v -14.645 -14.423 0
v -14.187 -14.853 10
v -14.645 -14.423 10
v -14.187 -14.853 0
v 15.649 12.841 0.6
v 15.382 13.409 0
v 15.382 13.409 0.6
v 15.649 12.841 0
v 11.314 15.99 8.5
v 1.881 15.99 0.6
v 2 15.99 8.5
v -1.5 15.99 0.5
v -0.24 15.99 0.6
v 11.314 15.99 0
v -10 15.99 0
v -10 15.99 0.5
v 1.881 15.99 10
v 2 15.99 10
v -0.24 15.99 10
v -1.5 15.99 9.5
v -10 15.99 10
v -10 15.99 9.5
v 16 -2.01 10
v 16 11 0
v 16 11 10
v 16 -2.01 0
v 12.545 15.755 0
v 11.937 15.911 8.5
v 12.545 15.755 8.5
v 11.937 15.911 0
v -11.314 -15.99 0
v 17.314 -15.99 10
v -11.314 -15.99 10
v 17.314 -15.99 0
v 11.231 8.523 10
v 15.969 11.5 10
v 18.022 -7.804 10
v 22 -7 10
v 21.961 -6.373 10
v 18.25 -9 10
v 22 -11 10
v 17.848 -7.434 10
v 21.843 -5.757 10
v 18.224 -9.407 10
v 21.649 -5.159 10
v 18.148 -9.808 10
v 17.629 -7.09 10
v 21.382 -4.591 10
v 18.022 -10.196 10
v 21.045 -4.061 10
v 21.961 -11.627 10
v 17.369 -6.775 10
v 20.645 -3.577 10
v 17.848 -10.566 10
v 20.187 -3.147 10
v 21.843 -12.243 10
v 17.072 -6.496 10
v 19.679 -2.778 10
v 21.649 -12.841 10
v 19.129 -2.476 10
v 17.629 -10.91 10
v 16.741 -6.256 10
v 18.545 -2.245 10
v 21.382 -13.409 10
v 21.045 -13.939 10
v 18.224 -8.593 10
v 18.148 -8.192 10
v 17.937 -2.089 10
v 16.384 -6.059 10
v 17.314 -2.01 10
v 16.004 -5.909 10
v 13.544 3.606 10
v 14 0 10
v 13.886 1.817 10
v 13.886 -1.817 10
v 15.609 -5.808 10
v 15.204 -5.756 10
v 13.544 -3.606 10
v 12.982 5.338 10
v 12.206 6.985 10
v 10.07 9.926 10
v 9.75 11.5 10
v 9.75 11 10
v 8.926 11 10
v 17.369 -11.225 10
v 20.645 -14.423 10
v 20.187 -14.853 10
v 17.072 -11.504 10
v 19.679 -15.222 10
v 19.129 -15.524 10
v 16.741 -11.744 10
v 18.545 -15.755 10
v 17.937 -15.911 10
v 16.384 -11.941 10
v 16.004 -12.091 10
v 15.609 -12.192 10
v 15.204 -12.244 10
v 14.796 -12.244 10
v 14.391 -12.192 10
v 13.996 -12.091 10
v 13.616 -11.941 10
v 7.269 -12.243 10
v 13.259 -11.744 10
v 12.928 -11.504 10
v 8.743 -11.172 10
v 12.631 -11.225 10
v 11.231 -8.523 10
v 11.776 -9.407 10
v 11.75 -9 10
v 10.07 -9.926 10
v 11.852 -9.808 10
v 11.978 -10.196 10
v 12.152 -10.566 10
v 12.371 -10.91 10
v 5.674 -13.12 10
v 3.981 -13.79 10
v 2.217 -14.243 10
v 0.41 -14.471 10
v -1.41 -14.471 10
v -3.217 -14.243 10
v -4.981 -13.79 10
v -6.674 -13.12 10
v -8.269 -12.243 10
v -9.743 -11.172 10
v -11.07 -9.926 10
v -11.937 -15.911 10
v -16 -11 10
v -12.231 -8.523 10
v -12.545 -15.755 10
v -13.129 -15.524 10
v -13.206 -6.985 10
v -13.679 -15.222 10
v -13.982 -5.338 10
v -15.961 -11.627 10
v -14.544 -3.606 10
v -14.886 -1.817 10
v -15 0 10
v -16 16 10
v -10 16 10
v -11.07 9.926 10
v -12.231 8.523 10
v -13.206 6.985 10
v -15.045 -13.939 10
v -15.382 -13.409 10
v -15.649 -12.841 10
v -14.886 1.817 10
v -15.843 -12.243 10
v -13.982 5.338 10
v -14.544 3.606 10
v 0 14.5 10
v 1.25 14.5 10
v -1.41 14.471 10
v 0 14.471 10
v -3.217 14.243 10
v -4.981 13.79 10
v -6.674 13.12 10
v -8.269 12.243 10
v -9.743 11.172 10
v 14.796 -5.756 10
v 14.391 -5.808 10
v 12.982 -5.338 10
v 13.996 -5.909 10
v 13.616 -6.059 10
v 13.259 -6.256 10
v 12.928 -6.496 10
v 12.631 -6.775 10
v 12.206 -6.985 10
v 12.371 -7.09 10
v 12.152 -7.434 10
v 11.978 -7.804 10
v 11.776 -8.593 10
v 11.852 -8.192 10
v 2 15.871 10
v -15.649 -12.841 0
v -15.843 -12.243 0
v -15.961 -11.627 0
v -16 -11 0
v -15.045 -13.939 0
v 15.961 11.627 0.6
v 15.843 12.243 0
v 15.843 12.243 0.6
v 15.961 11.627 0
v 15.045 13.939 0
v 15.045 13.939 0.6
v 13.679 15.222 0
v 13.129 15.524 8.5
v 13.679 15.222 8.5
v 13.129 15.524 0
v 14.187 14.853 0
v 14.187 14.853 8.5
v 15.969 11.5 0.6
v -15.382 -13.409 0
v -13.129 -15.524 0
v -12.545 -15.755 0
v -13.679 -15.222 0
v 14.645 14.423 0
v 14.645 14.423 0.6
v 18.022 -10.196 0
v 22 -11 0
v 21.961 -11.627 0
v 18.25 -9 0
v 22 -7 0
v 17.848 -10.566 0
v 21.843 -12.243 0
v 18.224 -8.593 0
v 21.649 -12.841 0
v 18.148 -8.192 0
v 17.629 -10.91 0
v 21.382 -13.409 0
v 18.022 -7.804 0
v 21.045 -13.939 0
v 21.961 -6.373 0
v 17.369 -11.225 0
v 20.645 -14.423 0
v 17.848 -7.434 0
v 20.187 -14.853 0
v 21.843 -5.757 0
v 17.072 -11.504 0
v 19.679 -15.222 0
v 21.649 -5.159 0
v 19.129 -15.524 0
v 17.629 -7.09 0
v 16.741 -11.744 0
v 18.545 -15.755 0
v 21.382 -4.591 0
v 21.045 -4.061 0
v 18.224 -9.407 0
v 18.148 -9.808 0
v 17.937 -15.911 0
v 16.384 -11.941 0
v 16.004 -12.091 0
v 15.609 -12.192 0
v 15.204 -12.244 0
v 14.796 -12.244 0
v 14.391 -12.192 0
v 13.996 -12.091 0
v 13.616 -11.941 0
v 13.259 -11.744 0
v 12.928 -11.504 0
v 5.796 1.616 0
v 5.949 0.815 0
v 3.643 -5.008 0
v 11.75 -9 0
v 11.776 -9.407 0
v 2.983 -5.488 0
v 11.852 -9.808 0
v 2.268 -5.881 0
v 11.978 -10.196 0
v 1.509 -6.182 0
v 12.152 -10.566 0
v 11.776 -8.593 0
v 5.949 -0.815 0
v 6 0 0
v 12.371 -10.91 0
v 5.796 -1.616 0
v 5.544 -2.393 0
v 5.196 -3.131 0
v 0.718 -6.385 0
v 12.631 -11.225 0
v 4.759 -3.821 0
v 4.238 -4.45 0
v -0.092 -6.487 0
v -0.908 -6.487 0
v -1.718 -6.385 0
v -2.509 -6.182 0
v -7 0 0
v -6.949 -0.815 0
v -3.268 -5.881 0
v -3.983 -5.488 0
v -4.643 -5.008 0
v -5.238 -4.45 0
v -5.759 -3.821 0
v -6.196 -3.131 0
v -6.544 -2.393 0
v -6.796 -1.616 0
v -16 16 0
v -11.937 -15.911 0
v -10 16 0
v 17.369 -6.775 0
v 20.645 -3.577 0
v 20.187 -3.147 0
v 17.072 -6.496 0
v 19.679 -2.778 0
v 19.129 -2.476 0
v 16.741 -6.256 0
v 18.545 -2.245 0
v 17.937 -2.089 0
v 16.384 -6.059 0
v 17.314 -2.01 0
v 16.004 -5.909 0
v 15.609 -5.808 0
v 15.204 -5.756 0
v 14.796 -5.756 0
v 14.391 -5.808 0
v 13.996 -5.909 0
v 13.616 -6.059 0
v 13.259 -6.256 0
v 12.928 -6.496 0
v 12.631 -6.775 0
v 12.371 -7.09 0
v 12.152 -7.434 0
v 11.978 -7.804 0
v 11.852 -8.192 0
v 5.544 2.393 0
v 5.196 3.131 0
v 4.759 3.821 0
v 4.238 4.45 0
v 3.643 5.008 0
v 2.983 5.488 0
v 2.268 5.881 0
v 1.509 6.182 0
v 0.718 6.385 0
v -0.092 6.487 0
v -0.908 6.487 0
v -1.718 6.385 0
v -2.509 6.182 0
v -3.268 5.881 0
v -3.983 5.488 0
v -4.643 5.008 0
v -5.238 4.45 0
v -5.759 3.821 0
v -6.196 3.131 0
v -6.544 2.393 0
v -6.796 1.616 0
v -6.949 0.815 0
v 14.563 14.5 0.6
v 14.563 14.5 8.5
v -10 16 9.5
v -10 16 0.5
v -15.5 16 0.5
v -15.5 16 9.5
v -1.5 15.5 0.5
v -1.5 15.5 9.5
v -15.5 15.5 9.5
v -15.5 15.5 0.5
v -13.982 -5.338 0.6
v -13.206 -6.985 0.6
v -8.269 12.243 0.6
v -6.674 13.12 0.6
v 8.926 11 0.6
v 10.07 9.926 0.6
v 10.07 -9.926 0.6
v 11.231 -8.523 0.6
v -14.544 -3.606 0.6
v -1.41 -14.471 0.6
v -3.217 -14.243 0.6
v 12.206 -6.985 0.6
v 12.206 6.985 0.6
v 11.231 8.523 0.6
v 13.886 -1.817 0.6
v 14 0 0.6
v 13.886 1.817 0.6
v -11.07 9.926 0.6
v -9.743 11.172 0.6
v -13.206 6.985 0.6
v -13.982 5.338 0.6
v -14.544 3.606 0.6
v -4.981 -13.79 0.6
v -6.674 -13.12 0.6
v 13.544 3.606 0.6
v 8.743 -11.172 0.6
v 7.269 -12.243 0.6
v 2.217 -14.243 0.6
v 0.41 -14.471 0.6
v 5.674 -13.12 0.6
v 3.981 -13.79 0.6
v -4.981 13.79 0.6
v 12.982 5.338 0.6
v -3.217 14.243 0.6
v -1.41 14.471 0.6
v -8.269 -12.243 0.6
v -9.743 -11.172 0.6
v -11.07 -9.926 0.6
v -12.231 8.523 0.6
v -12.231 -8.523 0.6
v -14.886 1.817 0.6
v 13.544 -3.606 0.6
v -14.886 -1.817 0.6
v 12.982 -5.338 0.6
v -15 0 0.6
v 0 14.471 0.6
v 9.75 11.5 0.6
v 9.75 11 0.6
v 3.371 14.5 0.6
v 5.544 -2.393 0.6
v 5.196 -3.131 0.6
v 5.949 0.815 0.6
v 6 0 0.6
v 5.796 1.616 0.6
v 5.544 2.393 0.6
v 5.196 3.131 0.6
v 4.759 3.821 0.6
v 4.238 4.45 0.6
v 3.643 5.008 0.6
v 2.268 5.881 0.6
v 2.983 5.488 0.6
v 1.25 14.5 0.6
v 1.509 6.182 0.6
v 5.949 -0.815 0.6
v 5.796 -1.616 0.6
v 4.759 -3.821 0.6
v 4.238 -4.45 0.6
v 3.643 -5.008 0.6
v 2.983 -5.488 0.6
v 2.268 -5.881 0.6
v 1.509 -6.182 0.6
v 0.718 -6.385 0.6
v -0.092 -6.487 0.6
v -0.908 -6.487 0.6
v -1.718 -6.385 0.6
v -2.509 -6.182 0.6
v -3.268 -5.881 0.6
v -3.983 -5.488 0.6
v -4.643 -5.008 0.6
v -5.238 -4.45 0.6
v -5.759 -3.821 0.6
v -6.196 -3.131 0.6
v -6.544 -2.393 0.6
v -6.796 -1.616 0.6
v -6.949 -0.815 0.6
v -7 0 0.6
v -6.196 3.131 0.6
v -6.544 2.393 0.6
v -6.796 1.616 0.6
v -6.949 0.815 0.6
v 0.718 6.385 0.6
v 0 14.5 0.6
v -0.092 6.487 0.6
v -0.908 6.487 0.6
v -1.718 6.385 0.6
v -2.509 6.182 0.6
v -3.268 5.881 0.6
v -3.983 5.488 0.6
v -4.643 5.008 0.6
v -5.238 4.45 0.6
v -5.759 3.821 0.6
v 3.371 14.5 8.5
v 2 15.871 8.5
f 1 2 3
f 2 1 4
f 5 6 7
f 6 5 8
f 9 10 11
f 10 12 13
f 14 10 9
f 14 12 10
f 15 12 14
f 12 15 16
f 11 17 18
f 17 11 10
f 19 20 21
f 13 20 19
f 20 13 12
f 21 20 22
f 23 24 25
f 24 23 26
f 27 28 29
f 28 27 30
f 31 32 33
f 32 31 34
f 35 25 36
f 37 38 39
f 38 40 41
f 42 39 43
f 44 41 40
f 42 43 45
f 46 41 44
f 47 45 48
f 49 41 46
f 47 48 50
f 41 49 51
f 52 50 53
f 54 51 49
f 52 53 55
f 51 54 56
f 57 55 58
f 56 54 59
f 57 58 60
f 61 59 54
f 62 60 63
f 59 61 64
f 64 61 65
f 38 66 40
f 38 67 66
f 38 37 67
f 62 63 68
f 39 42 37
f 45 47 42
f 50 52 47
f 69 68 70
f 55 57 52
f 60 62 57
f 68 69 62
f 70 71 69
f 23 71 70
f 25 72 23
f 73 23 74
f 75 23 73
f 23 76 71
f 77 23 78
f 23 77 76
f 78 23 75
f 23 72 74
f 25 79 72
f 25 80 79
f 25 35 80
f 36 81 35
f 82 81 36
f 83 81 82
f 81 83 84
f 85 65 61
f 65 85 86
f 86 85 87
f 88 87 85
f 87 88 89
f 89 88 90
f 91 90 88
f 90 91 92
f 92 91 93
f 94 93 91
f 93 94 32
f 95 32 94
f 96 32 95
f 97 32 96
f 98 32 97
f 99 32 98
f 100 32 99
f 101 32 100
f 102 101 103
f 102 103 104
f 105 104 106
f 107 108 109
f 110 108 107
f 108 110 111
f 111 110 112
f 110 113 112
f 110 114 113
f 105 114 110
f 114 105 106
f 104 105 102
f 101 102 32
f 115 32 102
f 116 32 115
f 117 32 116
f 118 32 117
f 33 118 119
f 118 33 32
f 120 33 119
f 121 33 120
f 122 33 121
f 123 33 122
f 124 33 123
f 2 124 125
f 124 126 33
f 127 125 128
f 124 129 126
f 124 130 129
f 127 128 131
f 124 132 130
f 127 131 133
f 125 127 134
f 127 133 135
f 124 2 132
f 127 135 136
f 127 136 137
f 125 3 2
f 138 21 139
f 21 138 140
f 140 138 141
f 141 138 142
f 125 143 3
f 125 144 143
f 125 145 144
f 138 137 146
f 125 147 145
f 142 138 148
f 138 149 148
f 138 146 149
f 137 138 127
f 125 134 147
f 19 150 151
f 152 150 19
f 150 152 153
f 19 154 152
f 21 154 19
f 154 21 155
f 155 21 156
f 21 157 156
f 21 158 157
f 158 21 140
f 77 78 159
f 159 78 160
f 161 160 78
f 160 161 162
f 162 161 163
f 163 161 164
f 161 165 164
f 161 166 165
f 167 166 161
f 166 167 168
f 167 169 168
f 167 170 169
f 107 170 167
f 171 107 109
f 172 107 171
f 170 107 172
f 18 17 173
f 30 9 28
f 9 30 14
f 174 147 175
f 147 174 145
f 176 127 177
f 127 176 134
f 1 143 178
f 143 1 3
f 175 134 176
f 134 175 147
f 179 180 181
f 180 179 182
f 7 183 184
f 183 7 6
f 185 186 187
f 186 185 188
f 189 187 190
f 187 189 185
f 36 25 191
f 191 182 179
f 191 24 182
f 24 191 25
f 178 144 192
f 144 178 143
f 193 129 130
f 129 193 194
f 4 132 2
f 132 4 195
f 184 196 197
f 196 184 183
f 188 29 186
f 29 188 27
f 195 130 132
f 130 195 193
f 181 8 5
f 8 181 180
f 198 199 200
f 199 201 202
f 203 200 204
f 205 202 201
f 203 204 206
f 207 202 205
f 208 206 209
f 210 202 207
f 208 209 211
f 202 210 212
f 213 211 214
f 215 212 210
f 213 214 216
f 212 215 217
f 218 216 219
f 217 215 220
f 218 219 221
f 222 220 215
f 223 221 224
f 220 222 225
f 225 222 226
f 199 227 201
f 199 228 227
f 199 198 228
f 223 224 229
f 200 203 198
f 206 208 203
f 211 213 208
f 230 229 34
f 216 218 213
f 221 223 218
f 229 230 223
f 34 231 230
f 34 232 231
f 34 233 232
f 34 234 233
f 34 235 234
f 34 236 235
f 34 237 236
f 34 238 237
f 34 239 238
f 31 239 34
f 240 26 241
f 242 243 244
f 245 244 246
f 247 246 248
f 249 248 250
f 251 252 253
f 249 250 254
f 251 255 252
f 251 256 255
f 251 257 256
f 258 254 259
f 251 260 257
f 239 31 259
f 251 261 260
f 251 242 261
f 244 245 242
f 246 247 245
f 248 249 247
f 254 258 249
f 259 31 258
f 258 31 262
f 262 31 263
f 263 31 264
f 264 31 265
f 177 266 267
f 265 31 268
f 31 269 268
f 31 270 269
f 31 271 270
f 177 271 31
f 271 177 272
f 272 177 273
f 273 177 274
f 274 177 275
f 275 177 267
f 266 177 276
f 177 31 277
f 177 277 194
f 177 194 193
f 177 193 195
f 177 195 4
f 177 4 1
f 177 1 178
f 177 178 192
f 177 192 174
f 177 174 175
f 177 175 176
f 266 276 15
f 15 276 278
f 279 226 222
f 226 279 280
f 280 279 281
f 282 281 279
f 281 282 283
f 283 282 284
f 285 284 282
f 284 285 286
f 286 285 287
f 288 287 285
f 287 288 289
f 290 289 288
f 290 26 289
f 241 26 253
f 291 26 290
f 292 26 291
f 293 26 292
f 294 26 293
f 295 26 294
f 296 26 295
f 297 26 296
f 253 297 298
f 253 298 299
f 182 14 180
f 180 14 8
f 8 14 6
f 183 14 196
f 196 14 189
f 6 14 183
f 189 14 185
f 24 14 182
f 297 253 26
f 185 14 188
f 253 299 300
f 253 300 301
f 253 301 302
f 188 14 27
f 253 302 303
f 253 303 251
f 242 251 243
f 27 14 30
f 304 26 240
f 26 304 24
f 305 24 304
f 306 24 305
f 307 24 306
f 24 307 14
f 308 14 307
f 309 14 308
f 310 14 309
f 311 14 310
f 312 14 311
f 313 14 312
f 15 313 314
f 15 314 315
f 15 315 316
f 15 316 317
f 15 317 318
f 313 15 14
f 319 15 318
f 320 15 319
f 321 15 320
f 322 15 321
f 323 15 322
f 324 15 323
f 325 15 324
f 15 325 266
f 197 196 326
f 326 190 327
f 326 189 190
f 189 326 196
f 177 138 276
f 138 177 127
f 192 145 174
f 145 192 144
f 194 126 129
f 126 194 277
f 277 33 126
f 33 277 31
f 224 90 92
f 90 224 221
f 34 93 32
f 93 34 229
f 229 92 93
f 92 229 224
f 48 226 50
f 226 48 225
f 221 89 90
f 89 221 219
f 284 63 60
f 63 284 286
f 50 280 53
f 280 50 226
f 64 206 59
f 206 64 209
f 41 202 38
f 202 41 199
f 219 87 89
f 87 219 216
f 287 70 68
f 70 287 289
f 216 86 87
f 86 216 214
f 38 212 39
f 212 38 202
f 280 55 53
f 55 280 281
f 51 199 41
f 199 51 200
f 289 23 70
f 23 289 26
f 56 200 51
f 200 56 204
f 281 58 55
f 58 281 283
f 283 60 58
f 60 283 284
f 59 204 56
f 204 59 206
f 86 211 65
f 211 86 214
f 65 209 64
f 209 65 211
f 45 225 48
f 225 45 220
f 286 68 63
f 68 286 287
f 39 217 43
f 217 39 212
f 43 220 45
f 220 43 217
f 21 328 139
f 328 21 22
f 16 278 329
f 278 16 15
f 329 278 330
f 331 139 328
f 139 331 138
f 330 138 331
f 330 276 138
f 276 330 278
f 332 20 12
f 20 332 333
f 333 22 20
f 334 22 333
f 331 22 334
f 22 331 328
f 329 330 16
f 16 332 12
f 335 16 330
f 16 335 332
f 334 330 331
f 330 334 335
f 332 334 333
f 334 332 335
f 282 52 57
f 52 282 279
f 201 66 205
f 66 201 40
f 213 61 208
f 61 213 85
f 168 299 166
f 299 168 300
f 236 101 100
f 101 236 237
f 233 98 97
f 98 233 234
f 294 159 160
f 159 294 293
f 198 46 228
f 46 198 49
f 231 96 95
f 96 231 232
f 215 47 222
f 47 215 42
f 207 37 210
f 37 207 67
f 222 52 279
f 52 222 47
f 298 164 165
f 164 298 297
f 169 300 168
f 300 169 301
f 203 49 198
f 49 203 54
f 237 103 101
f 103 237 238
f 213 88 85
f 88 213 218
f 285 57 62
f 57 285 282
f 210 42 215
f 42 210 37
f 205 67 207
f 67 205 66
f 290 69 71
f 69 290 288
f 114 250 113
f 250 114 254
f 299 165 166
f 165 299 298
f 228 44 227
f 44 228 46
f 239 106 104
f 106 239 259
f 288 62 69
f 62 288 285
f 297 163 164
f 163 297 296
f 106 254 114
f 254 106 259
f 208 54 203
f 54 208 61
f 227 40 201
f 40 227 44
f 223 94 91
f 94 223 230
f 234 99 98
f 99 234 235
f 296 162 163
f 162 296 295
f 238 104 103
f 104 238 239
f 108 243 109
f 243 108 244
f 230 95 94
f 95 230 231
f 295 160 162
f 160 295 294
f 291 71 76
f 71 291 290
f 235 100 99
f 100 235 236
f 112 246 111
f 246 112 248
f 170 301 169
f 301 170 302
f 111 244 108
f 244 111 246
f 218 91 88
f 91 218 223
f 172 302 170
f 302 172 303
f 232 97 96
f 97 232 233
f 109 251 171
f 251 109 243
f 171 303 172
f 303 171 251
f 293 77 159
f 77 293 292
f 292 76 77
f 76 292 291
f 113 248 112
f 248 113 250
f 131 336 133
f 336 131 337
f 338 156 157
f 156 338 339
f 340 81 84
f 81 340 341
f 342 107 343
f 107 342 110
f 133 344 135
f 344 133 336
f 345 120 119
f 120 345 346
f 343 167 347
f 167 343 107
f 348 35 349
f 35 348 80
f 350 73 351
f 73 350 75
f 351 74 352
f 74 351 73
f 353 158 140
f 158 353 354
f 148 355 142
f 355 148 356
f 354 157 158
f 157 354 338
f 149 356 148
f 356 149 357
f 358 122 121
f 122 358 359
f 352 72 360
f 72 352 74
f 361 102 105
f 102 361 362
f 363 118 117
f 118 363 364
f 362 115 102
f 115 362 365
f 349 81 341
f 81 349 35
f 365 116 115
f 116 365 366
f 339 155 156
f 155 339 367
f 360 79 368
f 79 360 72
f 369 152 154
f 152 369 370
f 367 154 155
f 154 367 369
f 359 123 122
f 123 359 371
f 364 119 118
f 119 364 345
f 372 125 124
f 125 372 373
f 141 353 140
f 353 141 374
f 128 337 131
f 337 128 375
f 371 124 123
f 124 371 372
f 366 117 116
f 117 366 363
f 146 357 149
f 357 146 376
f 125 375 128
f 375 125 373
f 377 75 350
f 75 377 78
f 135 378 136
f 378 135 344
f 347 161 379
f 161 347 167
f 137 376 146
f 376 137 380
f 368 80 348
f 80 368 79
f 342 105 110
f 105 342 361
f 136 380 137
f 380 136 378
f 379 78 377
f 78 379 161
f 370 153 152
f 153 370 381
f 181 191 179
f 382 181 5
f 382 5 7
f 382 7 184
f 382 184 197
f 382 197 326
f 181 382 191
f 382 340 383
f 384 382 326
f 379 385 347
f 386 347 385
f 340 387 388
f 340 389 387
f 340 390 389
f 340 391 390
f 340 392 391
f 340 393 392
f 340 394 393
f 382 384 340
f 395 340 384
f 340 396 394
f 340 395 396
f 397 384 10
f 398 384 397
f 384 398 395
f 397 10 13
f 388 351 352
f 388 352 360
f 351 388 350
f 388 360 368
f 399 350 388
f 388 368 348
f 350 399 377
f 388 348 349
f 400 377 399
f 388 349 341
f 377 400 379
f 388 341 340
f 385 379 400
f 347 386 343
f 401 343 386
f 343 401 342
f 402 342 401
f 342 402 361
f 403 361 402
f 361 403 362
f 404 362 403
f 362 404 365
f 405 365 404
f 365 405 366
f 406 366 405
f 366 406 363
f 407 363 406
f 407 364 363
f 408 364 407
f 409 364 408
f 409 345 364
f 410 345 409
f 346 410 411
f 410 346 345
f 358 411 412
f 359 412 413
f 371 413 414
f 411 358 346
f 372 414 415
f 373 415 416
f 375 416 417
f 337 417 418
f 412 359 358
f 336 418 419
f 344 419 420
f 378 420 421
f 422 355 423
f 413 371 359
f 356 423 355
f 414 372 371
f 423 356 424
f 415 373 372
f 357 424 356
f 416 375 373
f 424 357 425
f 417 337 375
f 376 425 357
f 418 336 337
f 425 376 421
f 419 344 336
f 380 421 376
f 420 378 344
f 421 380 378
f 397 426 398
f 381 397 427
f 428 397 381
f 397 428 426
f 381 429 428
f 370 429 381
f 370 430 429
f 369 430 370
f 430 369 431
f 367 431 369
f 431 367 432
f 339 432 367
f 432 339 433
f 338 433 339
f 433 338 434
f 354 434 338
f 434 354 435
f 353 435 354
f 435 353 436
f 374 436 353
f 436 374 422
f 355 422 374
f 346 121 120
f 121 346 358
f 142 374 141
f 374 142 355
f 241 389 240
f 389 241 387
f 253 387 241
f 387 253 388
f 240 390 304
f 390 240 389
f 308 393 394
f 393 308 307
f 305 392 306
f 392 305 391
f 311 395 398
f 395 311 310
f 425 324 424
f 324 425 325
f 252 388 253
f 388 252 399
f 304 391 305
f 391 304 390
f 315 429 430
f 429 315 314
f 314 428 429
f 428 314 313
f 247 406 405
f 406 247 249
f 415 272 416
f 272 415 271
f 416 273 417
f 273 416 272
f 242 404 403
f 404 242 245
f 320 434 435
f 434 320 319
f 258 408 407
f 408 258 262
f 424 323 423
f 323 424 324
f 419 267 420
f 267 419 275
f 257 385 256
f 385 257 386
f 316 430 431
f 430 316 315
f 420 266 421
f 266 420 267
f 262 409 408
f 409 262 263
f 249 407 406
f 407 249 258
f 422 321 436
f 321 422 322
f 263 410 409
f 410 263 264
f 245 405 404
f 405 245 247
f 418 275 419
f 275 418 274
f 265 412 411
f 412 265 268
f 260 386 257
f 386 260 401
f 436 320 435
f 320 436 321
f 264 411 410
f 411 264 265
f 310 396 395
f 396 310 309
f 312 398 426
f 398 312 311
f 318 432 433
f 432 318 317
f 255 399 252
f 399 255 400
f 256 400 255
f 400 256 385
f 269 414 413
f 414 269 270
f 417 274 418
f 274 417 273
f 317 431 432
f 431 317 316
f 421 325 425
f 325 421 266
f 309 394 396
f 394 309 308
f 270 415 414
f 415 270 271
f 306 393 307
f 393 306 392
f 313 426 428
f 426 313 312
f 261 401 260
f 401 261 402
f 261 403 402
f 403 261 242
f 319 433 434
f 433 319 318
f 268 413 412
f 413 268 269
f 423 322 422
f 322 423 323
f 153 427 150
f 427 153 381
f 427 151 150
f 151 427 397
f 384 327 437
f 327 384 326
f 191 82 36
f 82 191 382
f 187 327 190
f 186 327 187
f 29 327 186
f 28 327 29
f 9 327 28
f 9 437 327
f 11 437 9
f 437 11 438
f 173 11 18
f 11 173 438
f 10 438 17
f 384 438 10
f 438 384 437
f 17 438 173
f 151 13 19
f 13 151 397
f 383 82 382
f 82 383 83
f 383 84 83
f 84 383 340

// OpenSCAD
$fn = 50;


difference() {
	union() {
		hull() {
			translate(v = [-11.0000000000, 11.0000000000, 0]) {
				cylinder(h = 10, r = 5);
			}
			translate(v = [11.0000000000, 11.0000000000, 0]) {
				cylinder(h = 10, r = 5);
			}
			translate(v = [-11.0000000000, -11.0000000000, 0]) {
				cylinder(h = 10, r = 5);
			}
			translate(v = [11.0000000000, -11.0000000000, 0]) {
				cylinder(h = 10, r = 5);
			}
		}
		translate(v = [7.5000000000, -9.0000000000, 0]) {
			hull() {
				translate(v = [-9.5000000000, 2.0000000000, 0]) {
					cylinder(h = 10, r = 5);
				}
				translate(v = [9.5000000000, 2.0000000000, 0]) {
					cylinder(h = 10, r = 5);
				}
				translate(v = [-9.5000000000, -2.0000000000, 0]) {
					cylinder(h = 10, r = 5);
				}
				translate(v = [9.5000000000, -2.0000000000, 0]) {
					cylinder(h = 10, r = 5);
				}
			}
		}
		translate(v = [-16.0000000000, 10.0000000000, 0]) {
			cube(size = [6, 6, 10]);
		}
	}
	union() {
		translate(v = [-15.5000000000, 15.5000000000, 0.5000000000]) {
			cube(size = [14, 0.5000000000, 9.0000000000]);
		}
		translate(v = [15.0000000000, -9.0000000000, -50.0000000000]) {
			cylinder(h = 100, r = 3.2500000000);
		}
		translate(v = [-0.5000000000, 0.0000000000, 0.6000000000]) {
			cylinder(h = 12.4000000000, r = 14.5000000000);
		}
		translate(v = [-0.5000000000, 0.0000000000, -5.0000000000]) {
			cylinder(h = 10, r = 6.5000000000);
		}
		translate(v = [0.0000000000, 11.5000000000, 0.6000000000]) {
			cube(size = [16.0000000000, 3, 12.4000000000]);
		}
		translate(v = [2.0000000000, 11.5000000000, 8.5000000000]) {
			cube(size = [14.0000000000, 6, 1.5000000000]);
		}
		translate(v = [-3.0000000000, 18.7500000000, 0.6000000000]) {
			rotate(a = [0, 0, -45]) {
				cube(size = [10, 1.5000000000, 12.4000000000]);
			}
		}
		translate(v = [2.2500000000, 11.0000000000, 0.6000000000]) {
			cube(size = [7.5000000000, 2, 9.4000000000]);
		}
	}
}
